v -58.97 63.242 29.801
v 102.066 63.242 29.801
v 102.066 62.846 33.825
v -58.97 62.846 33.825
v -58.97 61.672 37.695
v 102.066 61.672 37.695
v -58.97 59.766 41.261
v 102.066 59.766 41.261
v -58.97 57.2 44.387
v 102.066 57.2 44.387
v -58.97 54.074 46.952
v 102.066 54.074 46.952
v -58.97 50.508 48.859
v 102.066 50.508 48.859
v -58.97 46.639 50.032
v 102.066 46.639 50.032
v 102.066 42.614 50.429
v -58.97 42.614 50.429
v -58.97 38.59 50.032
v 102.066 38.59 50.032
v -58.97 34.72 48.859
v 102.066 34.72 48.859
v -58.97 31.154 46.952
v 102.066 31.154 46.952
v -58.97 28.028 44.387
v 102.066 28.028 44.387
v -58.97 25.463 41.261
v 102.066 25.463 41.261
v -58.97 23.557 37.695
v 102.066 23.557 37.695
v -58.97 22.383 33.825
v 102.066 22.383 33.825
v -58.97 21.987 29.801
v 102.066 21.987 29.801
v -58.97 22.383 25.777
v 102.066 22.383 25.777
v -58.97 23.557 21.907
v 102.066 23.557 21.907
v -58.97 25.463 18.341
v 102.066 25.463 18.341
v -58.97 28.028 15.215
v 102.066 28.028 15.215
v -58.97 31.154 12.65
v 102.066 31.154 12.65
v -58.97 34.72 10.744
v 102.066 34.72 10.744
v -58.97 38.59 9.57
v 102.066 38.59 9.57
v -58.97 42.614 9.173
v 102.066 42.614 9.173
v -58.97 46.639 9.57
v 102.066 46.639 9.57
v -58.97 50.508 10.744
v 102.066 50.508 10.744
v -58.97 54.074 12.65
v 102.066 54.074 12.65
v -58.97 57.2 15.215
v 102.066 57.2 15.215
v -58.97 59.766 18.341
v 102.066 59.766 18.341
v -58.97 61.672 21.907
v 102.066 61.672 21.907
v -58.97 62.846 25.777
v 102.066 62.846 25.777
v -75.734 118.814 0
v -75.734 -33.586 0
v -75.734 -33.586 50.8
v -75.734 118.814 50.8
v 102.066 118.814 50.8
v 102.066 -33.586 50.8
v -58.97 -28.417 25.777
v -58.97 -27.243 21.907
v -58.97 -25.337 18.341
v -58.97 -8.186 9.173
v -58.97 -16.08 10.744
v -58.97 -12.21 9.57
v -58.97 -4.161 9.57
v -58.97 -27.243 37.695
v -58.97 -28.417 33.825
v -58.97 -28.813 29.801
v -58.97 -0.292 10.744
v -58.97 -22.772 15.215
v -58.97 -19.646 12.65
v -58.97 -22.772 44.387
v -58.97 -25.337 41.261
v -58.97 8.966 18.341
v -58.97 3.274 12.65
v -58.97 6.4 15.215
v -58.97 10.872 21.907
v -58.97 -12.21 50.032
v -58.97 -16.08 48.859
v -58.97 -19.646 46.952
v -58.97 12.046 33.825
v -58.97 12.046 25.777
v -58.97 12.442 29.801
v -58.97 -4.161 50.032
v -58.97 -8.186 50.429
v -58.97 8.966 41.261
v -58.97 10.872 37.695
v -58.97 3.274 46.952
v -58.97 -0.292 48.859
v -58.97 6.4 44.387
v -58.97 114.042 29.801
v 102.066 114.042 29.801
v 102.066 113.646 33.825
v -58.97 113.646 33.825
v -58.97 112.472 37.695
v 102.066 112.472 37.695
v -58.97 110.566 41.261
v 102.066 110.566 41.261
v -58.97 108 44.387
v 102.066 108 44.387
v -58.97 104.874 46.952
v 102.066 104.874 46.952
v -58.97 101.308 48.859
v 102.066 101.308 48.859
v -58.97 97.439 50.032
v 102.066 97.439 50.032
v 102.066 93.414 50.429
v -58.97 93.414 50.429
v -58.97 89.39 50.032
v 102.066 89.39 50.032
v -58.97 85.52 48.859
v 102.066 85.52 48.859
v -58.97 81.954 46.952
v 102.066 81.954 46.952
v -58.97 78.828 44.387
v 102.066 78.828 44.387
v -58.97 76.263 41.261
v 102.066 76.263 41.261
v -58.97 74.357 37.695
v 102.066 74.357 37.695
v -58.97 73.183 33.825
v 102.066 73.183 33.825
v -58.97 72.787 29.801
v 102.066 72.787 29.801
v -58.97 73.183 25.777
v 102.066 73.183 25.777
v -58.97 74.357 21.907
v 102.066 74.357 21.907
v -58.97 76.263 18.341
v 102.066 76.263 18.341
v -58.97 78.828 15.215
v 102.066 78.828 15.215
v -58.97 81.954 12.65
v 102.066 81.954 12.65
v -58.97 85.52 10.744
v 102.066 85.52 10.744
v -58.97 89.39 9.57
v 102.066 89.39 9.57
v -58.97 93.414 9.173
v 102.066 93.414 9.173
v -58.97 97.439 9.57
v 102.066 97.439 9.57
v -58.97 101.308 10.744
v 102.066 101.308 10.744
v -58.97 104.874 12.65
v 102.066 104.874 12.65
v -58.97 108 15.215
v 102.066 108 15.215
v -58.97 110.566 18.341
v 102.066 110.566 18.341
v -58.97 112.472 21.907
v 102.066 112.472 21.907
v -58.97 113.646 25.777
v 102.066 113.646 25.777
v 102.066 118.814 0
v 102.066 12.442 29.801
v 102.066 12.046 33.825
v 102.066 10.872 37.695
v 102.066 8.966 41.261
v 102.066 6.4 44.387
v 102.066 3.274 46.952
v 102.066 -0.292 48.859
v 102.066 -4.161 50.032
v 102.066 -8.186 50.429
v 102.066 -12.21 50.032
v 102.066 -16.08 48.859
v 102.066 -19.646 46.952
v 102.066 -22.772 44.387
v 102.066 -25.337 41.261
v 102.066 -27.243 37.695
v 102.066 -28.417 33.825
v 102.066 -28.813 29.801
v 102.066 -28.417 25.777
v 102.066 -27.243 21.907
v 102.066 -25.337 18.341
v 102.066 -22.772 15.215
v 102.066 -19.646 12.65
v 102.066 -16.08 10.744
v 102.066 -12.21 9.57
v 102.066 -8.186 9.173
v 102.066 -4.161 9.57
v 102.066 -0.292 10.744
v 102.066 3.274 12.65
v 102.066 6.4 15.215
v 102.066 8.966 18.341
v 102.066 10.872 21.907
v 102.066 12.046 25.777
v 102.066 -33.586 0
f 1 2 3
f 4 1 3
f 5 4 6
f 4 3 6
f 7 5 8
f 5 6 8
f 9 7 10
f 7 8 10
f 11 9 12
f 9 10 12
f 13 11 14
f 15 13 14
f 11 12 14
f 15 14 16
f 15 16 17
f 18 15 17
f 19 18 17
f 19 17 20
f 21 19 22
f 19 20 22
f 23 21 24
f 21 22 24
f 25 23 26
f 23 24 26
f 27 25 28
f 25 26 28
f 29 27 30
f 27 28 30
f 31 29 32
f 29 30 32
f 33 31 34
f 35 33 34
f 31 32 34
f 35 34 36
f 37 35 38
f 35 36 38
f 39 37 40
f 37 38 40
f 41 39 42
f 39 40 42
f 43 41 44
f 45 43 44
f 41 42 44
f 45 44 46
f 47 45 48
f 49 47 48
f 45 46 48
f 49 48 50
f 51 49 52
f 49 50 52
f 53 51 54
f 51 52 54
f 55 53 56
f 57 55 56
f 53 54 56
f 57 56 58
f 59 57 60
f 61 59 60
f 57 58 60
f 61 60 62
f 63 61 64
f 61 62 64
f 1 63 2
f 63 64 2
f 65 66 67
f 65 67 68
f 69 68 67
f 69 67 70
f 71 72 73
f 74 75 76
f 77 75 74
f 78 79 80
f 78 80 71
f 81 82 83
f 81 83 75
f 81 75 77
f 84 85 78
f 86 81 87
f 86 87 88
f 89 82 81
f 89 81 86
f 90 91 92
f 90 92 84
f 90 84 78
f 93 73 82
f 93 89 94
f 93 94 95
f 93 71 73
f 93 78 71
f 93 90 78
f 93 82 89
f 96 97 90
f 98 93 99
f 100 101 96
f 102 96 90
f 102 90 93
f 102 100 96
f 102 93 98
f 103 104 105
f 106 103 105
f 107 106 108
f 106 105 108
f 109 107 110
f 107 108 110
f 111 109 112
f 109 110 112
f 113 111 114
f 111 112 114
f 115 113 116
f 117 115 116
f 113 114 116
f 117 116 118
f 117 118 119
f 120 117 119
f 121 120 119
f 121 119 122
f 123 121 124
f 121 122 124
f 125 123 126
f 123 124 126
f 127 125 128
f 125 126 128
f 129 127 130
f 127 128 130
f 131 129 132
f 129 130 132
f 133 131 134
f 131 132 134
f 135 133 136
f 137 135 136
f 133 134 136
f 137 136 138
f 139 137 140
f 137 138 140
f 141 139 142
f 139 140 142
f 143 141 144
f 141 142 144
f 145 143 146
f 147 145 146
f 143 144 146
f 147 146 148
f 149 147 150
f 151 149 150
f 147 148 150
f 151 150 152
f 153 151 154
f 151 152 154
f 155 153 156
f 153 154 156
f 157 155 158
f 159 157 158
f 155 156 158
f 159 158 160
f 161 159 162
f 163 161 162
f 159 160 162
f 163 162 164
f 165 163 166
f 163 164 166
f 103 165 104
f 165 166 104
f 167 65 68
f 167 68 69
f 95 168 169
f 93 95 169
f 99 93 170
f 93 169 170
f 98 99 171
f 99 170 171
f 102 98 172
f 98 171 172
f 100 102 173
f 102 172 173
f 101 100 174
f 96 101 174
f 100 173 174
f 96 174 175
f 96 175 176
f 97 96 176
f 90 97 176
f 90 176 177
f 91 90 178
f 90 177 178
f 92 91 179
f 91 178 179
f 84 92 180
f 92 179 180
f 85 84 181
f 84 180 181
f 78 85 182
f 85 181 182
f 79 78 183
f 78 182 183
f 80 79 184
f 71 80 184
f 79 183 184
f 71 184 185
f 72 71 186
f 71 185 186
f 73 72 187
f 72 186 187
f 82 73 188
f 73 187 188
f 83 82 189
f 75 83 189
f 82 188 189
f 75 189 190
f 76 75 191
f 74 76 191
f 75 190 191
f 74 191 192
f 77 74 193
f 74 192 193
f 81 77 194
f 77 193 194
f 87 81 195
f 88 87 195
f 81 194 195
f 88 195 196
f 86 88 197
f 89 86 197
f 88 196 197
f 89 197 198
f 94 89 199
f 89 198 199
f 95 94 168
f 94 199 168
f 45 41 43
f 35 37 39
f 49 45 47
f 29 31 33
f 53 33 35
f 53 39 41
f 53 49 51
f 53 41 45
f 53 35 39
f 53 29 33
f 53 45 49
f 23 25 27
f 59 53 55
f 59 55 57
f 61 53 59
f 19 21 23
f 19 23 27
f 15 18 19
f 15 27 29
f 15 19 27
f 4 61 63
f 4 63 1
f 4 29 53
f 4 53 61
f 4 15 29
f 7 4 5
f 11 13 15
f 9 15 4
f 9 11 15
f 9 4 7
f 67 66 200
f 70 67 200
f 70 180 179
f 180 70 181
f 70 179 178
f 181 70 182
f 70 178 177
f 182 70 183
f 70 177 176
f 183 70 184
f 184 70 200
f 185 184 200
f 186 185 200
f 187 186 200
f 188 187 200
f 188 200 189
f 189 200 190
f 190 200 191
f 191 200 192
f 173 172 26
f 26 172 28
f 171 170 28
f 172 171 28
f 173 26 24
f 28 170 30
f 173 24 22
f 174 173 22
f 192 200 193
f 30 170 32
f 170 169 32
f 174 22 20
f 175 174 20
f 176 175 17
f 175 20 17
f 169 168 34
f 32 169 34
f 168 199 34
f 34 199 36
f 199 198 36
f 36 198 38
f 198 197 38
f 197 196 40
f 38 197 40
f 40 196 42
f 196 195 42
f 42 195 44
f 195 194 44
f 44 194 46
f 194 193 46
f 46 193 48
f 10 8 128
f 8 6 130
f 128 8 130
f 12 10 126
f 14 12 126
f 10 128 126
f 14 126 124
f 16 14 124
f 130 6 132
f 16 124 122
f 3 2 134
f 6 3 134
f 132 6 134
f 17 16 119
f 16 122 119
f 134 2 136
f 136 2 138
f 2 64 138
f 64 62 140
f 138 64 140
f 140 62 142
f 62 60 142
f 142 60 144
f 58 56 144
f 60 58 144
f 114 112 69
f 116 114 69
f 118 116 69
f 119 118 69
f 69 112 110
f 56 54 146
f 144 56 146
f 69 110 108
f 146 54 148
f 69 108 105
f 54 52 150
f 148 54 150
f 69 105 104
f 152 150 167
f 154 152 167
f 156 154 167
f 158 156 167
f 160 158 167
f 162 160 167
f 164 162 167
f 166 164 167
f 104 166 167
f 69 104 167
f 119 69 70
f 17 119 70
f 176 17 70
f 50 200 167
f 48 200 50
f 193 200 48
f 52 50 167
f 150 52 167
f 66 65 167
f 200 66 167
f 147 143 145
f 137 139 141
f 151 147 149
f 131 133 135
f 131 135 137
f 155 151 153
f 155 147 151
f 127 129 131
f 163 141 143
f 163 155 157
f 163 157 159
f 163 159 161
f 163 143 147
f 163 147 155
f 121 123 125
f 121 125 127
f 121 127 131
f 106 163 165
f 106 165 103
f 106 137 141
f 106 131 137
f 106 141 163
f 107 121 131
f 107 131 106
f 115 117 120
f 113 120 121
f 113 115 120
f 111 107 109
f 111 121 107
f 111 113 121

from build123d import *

# Parameters (mm, degrees)
F0_W     = 177.8
F0_H     = 152.4
F1_DEPTH = 50.8
F2_R     = 20.627653
F3_DEPTH = 161.036


with BuildPart() as f1:
    # F0 (on Top) → F1 (new body)
    with BuildSketch(Plane.XY):
        with Locations((13.166458, 42.614249)):
            Rectangle(F0_W, F0_H)
    extrude(amount=F1_DEPTH)

    # F2 (on face) → F3 (cut)
    with BuildSketch(Plane.YZ.offset(102.066458)):
        with Locations((-8.185751, 29.801123)):
            Circle(F2_R)
        with Locations((42.614249, 29.801123)):
            Circle(F2_R)
        with Locations((93.414249, 29.801123)):
            Circle(F2_R)
    extrude(amount=-F3_DEPTH, mode=Mode.SUBTRACT)


solid = f1.part
